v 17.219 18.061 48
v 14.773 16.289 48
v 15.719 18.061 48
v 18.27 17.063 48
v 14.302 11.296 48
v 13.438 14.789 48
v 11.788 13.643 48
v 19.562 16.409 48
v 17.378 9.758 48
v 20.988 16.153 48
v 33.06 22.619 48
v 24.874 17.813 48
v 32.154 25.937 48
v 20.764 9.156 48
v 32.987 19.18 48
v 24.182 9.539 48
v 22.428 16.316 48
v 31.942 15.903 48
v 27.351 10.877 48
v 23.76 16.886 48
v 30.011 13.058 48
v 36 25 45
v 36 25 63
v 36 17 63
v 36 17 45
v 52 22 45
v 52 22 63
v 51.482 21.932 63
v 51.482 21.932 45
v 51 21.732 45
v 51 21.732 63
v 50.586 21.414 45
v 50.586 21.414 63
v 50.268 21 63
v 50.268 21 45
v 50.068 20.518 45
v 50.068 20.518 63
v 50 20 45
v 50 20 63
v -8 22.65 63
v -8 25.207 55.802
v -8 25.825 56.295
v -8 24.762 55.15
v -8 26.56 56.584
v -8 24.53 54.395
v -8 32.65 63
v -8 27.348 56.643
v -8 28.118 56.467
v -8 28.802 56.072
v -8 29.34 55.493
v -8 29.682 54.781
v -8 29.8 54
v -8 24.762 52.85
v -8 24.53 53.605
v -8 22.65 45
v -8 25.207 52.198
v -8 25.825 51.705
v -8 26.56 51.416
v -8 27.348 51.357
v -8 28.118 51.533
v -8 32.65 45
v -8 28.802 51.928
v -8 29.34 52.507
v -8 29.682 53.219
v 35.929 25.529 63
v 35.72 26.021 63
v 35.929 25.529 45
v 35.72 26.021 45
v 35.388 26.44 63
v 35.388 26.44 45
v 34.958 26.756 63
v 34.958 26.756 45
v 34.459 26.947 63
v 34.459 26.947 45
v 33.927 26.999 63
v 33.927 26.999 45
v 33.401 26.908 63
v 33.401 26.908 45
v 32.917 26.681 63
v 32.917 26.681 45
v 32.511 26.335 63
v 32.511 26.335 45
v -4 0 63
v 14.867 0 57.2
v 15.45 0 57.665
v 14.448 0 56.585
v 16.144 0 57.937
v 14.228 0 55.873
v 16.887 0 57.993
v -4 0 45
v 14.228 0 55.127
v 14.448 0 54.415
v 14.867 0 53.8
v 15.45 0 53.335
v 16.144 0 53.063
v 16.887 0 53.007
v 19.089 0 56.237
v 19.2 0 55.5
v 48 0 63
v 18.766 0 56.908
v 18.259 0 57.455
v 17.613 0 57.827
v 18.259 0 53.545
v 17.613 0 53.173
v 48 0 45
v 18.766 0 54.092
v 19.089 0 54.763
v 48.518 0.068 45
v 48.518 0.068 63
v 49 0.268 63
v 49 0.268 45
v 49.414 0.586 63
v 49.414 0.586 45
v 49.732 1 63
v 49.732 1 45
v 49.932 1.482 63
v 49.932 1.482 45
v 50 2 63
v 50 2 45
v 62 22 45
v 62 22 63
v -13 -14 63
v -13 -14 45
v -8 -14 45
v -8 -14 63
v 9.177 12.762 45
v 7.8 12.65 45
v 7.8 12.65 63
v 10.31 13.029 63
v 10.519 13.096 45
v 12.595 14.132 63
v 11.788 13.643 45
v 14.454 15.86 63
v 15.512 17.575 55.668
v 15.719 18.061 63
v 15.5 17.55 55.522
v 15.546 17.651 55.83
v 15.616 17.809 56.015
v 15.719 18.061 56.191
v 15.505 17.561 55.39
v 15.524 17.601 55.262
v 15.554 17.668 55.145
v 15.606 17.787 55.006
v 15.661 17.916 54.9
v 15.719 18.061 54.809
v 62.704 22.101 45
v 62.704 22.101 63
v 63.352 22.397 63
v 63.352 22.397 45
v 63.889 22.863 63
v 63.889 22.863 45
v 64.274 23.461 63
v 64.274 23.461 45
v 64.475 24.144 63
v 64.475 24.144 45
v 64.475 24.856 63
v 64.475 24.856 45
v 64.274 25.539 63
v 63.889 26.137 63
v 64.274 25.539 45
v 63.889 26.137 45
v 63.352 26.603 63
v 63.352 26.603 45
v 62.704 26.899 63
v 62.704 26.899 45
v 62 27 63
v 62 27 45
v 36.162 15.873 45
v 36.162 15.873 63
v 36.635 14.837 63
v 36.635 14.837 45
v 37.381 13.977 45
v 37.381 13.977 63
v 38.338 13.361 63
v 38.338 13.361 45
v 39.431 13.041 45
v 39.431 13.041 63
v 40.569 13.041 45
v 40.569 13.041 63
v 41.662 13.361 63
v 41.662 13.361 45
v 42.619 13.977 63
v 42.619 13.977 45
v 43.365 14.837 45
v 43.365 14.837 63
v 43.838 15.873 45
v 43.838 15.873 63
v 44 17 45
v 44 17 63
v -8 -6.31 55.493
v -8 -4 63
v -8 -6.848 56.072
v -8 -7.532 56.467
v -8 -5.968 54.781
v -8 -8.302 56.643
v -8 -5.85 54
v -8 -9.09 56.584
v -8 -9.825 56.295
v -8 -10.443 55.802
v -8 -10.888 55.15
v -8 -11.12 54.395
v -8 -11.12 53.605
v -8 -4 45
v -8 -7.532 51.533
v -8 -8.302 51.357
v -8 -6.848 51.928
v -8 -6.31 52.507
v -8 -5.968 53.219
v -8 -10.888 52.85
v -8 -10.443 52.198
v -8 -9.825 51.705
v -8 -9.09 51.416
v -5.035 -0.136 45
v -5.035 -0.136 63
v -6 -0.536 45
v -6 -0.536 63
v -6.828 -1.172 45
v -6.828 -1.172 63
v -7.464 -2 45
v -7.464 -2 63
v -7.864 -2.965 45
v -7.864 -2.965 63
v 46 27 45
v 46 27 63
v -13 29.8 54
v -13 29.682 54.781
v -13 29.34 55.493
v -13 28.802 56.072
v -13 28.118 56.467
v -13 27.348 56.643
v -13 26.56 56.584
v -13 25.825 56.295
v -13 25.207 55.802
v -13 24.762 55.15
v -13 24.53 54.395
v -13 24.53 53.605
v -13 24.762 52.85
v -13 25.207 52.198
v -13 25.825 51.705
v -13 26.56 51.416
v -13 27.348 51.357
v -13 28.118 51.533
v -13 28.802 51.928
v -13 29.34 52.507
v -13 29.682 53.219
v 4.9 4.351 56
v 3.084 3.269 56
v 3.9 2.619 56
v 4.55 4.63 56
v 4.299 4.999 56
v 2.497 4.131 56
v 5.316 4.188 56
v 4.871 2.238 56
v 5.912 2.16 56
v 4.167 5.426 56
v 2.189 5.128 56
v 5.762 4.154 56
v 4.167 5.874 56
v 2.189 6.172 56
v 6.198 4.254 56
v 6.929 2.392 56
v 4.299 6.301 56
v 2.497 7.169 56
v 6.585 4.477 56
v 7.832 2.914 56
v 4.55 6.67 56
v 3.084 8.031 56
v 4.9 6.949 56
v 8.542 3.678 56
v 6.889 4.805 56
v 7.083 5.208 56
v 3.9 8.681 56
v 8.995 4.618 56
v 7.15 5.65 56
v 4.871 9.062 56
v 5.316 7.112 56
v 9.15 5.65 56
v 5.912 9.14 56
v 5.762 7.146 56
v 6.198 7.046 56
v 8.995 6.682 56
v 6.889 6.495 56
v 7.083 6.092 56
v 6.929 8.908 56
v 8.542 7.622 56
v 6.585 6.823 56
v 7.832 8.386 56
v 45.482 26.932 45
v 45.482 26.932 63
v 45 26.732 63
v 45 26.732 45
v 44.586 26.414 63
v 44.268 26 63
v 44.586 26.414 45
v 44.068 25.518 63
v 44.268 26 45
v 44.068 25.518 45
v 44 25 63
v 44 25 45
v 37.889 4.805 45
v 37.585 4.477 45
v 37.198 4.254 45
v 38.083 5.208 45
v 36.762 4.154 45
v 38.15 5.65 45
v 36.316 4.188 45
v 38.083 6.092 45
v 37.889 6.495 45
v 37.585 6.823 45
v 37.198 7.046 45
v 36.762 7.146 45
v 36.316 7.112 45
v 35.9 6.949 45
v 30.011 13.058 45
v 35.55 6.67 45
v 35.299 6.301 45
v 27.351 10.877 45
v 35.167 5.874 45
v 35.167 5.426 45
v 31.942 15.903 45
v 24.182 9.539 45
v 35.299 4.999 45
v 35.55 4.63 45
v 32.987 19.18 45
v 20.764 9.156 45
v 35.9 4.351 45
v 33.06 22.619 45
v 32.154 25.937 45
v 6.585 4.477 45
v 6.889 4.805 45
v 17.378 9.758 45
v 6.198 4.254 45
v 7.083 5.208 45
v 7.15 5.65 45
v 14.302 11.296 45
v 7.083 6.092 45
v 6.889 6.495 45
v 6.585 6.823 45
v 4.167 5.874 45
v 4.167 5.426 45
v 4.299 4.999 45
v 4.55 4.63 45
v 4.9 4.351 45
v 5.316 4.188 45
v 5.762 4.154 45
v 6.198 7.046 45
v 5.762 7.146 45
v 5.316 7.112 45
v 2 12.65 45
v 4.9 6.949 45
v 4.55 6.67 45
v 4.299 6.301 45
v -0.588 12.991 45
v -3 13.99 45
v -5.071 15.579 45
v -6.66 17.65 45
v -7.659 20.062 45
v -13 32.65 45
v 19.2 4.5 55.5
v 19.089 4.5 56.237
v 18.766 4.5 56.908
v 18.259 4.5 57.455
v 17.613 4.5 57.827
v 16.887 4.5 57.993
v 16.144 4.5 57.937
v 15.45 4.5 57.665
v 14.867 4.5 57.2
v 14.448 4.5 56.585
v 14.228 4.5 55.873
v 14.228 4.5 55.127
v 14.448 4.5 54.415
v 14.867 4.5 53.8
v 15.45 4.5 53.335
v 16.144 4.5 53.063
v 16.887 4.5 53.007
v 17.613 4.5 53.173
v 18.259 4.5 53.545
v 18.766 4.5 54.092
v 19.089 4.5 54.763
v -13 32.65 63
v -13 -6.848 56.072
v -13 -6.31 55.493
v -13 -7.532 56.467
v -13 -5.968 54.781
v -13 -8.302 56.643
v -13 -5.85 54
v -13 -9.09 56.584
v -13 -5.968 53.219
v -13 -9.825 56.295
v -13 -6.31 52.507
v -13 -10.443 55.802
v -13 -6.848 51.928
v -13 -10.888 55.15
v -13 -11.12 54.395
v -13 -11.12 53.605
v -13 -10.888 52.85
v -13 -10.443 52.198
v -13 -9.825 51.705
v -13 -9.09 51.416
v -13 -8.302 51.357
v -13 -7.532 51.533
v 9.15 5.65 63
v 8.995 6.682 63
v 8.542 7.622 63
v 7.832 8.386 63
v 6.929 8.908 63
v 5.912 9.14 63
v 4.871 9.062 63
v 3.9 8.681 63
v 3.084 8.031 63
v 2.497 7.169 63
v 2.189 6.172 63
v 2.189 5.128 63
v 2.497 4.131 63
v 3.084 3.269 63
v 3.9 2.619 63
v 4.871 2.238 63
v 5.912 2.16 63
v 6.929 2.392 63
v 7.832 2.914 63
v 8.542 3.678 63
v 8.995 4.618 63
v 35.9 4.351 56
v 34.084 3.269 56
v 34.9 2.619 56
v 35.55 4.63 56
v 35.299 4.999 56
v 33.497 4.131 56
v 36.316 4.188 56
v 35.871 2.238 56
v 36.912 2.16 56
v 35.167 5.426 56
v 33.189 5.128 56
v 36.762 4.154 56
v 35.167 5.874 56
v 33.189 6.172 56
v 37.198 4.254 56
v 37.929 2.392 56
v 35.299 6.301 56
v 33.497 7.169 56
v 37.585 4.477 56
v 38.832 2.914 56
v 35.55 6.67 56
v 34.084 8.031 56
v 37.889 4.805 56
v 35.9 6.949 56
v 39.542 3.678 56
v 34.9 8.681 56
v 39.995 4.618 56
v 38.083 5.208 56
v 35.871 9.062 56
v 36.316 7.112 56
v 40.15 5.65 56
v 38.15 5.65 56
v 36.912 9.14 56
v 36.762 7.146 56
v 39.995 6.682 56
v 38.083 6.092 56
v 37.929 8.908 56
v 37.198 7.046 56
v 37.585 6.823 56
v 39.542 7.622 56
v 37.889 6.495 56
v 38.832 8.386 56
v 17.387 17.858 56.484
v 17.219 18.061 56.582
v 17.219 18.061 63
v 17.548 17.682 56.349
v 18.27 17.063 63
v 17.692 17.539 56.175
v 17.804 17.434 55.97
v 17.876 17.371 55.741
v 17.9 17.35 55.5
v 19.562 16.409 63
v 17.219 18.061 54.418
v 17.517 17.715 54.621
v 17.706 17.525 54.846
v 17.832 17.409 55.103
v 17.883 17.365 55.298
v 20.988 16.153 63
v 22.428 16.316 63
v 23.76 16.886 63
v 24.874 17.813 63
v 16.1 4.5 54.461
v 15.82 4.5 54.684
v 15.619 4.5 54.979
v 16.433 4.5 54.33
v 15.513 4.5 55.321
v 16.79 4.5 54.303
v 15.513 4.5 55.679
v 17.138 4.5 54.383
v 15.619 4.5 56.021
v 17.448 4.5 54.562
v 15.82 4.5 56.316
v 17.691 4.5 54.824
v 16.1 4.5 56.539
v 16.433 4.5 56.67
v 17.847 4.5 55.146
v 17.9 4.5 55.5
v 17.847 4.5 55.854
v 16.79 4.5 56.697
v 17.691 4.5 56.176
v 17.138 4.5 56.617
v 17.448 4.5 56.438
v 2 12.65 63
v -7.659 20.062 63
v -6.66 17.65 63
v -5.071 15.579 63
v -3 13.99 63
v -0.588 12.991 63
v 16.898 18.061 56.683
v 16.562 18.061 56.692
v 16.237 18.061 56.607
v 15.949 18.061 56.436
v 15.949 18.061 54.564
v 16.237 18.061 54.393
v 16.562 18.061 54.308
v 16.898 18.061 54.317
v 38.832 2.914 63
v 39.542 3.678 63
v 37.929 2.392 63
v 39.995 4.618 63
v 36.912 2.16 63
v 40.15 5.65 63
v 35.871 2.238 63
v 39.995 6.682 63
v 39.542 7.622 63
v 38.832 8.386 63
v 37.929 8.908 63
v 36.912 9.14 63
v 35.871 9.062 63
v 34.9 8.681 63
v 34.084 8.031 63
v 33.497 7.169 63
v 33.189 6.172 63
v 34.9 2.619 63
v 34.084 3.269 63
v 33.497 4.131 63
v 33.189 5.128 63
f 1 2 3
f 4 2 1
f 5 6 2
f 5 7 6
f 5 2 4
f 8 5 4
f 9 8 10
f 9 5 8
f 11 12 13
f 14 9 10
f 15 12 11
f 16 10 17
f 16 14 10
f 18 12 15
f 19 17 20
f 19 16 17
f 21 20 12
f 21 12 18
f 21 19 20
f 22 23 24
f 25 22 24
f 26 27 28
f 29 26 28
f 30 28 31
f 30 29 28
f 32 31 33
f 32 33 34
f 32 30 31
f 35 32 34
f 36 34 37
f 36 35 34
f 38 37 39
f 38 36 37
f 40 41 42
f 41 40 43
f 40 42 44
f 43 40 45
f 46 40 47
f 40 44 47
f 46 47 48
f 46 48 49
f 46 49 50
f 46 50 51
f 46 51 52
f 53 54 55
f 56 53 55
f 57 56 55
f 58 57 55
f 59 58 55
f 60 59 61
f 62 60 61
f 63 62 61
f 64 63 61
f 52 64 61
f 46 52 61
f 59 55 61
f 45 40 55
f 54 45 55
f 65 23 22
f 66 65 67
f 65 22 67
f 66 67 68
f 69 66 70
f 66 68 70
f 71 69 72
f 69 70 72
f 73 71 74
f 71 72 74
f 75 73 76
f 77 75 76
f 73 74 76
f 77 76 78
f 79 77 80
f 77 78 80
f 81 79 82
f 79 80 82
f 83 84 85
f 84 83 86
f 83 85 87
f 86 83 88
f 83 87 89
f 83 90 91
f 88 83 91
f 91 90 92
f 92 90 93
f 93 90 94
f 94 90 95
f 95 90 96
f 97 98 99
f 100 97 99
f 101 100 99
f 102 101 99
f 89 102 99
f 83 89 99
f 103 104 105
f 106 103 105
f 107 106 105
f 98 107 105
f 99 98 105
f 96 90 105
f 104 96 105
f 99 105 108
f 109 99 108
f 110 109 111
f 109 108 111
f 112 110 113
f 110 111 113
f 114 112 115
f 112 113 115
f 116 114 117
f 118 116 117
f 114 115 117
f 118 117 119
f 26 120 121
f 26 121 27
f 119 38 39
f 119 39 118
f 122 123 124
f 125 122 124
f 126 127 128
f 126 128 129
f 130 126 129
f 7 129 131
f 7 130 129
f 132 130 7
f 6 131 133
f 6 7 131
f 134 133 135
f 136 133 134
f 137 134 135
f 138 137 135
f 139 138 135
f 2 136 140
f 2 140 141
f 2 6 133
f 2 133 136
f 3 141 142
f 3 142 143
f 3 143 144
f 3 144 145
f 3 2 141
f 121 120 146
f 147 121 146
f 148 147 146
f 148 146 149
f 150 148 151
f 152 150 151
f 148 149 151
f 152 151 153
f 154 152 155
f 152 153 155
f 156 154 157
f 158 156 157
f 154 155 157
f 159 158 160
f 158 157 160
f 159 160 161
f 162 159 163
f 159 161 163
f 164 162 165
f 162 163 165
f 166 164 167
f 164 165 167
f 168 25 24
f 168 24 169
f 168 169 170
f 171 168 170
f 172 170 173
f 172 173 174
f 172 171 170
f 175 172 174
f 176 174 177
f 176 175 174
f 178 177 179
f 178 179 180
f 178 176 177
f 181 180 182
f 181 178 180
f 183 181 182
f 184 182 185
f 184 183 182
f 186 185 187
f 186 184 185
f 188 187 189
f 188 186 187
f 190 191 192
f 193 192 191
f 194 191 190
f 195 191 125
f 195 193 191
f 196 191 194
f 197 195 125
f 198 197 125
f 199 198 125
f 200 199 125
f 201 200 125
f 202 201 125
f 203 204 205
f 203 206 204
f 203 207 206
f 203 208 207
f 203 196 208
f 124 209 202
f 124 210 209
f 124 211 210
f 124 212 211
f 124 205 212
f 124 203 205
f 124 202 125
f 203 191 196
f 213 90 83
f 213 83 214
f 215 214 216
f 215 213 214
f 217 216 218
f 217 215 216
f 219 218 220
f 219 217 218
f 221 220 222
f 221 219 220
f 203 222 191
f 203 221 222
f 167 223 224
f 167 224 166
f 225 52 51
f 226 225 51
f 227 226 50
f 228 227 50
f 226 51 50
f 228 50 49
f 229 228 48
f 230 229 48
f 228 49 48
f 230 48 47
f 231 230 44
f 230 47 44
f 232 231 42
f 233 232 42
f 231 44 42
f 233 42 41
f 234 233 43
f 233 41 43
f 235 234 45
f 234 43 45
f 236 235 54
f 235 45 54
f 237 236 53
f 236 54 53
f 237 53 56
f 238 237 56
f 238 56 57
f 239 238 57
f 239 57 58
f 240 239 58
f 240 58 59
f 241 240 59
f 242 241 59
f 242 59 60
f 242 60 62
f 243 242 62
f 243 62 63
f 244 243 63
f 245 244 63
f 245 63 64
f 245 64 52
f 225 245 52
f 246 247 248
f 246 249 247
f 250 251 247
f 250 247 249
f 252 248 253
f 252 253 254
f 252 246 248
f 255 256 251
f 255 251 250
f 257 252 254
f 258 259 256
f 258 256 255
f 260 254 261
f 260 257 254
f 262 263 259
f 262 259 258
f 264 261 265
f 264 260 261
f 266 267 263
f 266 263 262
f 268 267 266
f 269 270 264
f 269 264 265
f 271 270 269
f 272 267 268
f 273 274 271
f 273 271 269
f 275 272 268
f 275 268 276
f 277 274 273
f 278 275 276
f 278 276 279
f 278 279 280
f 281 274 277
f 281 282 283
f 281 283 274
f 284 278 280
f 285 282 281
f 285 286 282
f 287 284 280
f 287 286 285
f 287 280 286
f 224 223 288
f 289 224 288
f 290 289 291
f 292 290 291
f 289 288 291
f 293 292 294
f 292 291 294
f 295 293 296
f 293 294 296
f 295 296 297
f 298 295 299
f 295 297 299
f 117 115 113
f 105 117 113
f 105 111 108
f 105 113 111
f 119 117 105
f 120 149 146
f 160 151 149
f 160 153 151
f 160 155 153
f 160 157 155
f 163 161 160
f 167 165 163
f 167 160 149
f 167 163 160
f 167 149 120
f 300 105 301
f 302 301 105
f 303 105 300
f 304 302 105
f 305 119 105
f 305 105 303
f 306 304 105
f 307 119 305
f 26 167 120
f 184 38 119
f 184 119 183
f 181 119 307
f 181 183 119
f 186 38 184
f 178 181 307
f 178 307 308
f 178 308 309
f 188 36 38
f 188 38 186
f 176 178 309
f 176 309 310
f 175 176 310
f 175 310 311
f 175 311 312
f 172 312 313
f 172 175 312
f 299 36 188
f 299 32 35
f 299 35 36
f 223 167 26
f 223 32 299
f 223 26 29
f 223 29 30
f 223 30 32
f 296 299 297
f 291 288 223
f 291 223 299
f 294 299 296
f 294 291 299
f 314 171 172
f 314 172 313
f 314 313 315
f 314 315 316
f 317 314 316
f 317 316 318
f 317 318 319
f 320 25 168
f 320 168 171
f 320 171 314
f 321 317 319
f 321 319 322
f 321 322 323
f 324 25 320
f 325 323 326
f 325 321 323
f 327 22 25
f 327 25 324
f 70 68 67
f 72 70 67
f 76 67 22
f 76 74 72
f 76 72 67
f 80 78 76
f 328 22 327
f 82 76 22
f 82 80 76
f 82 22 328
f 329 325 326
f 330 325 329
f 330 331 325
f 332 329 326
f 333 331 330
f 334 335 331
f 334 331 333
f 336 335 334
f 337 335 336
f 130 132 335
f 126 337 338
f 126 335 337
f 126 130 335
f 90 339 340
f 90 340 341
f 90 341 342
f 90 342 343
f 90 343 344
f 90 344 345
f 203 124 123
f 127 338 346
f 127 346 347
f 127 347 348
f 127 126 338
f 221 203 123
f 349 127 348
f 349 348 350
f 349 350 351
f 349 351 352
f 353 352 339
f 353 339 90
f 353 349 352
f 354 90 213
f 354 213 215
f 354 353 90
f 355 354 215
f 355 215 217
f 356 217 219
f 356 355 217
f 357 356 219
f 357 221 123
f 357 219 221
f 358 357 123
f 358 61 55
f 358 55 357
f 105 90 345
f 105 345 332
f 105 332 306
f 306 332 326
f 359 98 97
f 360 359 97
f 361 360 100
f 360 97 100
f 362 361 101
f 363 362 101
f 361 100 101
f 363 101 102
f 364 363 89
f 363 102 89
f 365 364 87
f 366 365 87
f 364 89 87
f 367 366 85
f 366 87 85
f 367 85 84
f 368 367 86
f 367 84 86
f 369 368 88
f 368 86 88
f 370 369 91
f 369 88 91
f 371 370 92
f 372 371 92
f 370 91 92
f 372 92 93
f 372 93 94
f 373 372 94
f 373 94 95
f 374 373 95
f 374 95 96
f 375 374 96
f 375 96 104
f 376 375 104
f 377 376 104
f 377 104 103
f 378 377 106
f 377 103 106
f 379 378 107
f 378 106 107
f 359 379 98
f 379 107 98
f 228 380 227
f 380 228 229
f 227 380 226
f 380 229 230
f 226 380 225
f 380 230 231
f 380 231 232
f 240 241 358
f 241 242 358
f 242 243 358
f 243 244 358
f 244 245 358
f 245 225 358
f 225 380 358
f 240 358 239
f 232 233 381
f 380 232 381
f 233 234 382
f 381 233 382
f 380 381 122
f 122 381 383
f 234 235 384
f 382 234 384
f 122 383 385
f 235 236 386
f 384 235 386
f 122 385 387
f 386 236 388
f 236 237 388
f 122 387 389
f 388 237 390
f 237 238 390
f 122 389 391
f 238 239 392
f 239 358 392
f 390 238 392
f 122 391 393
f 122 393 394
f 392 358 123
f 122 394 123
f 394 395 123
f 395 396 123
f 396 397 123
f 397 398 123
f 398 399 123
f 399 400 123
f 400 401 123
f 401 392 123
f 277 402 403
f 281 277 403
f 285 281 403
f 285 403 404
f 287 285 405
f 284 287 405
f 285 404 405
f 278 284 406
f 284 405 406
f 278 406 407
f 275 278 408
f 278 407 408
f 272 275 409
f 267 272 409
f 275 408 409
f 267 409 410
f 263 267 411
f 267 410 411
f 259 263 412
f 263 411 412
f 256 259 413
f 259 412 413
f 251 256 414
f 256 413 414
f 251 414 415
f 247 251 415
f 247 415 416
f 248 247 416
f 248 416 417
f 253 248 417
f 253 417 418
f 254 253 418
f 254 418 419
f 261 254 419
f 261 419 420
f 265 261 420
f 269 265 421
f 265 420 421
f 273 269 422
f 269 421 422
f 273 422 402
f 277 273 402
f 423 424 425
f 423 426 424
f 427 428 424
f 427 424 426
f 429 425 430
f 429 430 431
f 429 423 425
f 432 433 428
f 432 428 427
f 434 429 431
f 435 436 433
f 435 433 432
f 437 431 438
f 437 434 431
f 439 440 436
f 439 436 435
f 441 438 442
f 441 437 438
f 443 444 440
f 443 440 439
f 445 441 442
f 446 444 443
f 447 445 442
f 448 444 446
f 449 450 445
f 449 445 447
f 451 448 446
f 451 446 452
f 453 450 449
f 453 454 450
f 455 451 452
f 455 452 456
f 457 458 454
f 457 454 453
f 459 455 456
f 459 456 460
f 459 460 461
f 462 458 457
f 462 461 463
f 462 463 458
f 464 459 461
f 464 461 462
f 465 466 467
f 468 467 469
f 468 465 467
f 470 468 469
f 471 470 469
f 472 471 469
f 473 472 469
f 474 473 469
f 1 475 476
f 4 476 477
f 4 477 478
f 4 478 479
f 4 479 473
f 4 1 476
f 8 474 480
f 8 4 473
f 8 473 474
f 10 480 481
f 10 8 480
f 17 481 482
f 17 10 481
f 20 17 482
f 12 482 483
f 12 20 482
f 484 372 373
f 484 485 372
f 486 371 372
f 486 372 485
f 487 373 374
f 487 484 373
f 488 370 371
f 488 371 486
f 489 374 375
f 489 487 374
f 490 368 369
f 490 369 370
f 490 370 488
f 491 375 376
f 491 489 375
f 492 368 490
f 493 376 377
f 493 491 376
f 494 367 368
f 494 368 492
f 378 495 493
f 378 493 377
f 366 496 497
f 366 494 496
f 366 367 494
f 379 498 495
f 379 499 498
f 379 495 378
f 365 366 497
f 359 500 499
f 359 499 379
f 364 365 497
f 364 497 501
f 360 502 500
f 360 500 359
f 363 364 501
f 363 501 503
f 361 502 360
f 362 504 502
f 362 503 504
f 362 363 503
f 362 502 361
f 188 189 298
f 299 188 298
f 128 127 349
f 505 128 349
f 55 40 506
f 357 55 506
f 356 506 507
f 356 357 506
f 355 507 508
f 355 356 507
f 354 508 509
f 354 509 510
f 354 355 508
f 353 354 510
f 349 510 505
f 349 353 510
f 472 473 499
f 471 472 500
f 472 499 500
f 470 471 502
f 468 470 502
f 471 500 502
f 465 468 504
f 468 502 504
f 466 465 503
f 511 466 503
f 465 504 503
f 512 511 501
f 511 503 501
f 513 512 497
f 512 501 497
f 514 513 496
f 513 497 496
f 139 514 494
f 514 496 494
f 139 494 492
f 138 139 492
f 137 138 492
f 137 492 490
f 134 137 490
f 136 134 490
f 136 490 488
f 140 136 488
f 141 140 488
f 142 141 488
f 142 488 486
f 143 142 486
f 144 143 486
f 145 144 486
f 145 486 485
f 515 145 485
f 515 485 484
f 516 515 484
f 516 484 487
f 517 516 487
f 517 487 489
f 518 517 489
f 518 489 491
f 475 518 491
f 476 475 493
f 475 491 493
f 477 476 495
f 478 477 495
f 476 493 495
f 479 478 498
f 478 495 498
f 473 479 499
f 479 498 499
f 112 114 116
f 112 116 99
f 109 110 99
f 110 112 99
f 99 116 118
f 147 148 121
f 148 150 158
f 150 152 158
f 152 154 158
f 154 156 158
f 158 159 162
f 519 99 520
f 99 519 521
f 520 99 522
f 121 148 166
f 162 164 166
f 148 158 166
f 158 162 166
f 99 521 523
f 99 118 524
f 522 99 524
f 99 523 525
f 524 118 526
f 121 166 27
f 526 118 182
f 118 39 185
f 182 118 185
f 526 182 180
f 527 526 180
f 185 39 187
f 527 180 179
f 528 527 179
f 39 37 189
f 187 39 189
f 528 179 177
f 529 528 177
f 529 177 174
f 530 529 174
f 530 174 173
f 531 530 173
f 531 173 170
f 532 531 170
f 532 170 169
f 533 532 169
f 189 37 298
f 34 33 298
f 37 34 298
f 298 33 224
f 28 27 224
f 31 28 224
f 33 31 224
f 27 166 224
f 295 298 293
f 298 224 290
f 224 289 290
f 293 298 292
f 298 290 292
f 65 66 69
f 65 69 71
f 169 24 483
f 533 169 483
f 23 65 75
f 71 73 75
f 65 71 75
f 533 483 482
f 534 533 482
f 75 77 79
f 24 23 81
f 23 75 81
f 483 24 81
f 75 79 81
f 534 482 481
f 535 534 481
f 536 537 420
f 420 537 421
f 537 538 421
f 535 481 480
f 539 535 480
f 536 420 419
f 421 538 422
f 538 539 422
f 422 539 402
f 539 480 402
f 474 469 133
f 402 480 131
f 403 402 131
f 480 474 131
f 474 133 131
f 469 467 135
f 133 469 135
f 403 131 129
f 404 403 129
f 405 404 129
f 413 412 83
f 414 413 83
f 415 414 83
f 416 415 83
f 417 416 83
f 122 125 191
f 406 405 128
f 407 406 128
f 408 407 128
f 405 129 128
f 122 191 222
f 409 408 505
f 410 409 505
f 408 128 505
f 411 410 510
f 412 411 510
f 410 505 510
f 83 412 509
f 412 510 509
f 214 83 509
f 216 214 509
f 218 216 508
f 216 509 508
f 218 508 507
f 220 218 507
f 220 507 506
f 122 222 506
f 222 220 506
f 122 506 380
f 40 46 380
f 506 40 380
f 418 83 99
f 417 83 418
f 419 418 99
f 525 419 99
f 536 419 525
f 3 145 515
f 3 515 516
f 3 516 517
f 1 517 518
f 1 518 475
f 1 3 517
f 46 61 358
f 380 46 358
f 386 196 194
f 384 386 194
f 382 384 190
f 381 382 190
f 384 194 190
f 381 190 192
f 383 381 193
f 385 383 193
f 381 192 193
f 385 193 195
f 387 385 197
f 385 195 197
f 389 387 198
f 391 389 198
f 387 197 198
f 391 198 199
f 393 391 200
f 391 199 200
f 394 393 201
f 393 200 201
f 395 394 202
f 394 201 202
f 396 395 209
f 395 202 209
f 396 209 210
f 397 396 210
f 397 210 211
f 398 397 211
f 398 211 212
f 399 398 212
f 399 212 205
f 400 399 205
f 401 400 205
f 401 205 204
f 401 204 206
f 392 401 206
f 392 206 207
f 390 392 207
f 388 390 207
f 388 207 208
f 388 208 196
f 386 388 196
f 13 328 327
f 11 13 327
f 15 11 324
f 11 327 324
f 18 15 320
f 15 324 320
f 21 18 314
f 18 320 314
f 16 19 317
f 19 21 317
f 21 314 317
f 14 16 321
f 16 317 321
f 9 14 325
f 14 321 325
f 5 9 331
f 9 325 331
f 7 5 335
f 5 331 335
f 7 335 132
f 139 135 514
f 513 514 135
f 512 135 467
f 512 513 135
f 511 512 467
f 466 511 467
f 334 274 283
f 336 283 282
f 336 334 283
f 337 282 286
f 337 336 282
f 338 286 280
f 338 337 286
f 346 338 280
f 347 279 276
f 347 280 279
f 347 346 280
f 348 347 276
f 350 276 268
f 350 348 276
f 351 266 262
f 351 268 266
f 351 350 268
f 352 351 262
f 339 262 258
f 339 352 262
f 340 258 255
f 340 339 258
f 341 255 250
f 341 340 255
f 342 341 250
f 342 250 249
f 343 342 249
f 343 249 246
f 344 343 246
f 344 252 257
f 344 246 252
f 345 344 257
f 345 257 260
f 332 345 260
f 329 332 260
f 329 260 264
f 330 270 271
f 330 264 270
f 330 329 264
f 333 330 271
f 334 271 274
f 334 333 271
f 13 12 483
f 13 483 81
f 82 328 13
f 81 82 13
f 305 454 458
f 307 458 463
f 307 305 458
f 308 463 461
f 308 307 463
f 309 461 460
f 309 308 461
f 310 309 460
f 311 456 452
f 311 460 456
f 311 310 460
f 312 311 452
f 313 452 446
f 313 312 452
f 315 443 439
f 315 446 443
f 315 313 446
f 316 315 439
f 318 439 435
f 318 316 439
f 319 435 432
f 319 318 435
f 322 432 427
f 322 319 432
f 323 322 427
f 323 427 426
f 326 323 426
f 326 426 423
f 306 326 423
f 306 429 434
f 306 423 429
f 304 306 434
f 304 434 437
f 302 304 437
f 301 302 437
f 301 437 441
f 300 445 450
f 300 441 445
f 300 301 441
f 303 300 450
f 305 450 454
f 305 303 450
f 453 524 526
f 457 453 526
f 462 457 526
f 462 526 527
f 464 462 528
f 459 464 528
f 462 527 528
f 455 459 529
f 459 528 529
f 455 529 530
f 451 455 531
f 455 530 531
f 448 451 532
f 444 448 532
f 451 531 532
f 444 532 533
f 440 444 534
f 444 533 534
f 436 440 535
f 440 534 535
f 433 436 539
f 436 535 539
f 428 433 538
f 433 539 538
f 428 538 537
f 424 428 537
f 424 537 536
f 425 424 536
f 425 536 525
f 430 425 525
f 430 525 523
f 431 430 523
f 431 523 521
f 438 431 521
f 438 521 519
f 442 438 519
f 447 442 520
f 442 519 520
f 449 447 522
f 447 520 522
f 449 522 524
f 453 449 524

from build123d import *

# Parameters (mm, degrees)
SKETCH011_R     = 1.5
PAD008_DEPTH    = 18
SKETCH012_R     = 12
POCKET_DEPTH    = 3
SKETCH015_R     = 1.2
POCKET007_DEPTH = 32.651
SKETCH016_R     = 2.5
POCKET008_DEPTH = 4.5
SKETCH022_R     = 3.5
POCKET009_DEPTH = 7
SKETCH023_R     = 2.65
POCKET010_DEPTH = 5.001


with BuildPart() as part:
    # Sketch011 → Pad008 (new body)
    with BuildSketch(Plane.XY.offset(45)):
        with BuildLine():
            ThreePointArc((7.8, 12.65), (12.595297, 14.1318), (15.718671, 18.060558))
            Line((15.718671, 18.060558), (17.218671, 18.060558))
            ThreePointArc((17.218671, 18.060558), (20.988406, 16.152612), (24.873527, 17.813033))
            Line((24.873527, 17.813033), (32.510589, 26.334787))
            ThreePointArc((36, 25), (34.714555, 26.867996), (32.510589, 26.334787))
            Line((36, 25), (36, 17))
            ThreePointArc((36, 17), (40, 13), (44, 17))
            Line((44, 17), (44, 25))
            ThreePointArc((45.999998, 27), (44.585786, 26.414213), (44, 25))
            Line((45.999998, 27), (62, 27))
            ThreePointArc((62, 22), (64.5, 24.5), (62, 27))
            Line((62, 22), (52, 22))
            ThreePointArc((52, 22), (50.585786, 21.414213), (50, 20))
            Line((50, 20), (50, 2))
            ThreePointArc((48, 0), (49.414214, 0.585787), (50, 2))
            Line((-4, 0), (48, 0))
            ThreePointArc((-4, 0), (-6.828417, -1.171563), (-8, -3.999973))
            Line((-8, -3.999973), (-8, -13.999973))
            Line((-13, -13.999973), (-8, -13.999973))
            Line((-13, 32.65), (-13, -13.999973))
            Line((-8, 32.65), (-13, 32.65))
            Line((-8, 22.65), (-8, 32.65))
            ThreePointArc((-8, 22.65), (-5.071068, 15.578932), (2, 12.65))
            Line((7.8, 12.65), (2, 12.65))
        make_face()
        with Locations((36.65, 5.65)):
            Circle(SKETCH011_R, mode=Mode.SUBTRACT)
        with Locations((5.65, 5.65)):
            Circle(SKETCH011_R, mode=Mode.SUBTRACT)
    extrude(amount=PAD008_DEPTH)

    # Sketch012 → Pocket (cut)
    with BuildSketch(Plane(origin=(0, 0, 45), x_dir=(1, 0, 0), z_dir=(0, 0, -1))):
        with Locations((21.15, -21.15)):
            Circle(SKETCH012_R)
    extrude(amount=-POCKET_DEPTH, mode=Mode.SUBTRACT)

    # Sketch015 → Pocket007 (cut, through all)
    with BuildSketch(Plane(origin=(0, 0, 45), x_dir=(1, 0, 0), z_dir=(0, -1, 0))):
        with Locations((16.7, 10.5)):
            Circle(SKETCH015_R)
    extrude(amount=-POCKET007_DEPTH, mode=Mode.SUBTRACT)

    # Sketch016 → Pocket008 (cut)
    with BuildSketch(Plane(origin=(0, 0, 45), x_dir=(1, 0, 0), z_dir=(0, -1, 0))):
        with Locations((16.7, 10.5)):
            Circle(SKETCH016_R)
    extrude(amount=-POCKET008_DEPTH, mode=Mode.SUBTRACT)

    # Sketch022 → Pocket009 (cut)
    with BuildSketch(Plane.XY.offset(63)):
        with Locations((5.65, 5.65)):
            Circle(SKETCH022_R)
        with Locations((36.65, 5.65)):
            Circle(SKETCH022_R)
    extrude(amount=-POCKET009_DEPTH, mode=Mode.SUBTRACT)

    # Sketch023 → Pocket010 (cut, through all)
    with BuildSketch(Plane(origin=(-8, 0, 45), x_dir=(0, 1, 0), z_dir=(1, 0, 0))):
        with Locations((-8.499973, 9)):
            Circle(SKETCH023_R)
        with Locations((27.15, 9)):
            Circle(SKETCH023_R)
    extrude(amount=-POCKET010_DEPTH, mode=Mode.SUBTRACT)


solid = part.part
